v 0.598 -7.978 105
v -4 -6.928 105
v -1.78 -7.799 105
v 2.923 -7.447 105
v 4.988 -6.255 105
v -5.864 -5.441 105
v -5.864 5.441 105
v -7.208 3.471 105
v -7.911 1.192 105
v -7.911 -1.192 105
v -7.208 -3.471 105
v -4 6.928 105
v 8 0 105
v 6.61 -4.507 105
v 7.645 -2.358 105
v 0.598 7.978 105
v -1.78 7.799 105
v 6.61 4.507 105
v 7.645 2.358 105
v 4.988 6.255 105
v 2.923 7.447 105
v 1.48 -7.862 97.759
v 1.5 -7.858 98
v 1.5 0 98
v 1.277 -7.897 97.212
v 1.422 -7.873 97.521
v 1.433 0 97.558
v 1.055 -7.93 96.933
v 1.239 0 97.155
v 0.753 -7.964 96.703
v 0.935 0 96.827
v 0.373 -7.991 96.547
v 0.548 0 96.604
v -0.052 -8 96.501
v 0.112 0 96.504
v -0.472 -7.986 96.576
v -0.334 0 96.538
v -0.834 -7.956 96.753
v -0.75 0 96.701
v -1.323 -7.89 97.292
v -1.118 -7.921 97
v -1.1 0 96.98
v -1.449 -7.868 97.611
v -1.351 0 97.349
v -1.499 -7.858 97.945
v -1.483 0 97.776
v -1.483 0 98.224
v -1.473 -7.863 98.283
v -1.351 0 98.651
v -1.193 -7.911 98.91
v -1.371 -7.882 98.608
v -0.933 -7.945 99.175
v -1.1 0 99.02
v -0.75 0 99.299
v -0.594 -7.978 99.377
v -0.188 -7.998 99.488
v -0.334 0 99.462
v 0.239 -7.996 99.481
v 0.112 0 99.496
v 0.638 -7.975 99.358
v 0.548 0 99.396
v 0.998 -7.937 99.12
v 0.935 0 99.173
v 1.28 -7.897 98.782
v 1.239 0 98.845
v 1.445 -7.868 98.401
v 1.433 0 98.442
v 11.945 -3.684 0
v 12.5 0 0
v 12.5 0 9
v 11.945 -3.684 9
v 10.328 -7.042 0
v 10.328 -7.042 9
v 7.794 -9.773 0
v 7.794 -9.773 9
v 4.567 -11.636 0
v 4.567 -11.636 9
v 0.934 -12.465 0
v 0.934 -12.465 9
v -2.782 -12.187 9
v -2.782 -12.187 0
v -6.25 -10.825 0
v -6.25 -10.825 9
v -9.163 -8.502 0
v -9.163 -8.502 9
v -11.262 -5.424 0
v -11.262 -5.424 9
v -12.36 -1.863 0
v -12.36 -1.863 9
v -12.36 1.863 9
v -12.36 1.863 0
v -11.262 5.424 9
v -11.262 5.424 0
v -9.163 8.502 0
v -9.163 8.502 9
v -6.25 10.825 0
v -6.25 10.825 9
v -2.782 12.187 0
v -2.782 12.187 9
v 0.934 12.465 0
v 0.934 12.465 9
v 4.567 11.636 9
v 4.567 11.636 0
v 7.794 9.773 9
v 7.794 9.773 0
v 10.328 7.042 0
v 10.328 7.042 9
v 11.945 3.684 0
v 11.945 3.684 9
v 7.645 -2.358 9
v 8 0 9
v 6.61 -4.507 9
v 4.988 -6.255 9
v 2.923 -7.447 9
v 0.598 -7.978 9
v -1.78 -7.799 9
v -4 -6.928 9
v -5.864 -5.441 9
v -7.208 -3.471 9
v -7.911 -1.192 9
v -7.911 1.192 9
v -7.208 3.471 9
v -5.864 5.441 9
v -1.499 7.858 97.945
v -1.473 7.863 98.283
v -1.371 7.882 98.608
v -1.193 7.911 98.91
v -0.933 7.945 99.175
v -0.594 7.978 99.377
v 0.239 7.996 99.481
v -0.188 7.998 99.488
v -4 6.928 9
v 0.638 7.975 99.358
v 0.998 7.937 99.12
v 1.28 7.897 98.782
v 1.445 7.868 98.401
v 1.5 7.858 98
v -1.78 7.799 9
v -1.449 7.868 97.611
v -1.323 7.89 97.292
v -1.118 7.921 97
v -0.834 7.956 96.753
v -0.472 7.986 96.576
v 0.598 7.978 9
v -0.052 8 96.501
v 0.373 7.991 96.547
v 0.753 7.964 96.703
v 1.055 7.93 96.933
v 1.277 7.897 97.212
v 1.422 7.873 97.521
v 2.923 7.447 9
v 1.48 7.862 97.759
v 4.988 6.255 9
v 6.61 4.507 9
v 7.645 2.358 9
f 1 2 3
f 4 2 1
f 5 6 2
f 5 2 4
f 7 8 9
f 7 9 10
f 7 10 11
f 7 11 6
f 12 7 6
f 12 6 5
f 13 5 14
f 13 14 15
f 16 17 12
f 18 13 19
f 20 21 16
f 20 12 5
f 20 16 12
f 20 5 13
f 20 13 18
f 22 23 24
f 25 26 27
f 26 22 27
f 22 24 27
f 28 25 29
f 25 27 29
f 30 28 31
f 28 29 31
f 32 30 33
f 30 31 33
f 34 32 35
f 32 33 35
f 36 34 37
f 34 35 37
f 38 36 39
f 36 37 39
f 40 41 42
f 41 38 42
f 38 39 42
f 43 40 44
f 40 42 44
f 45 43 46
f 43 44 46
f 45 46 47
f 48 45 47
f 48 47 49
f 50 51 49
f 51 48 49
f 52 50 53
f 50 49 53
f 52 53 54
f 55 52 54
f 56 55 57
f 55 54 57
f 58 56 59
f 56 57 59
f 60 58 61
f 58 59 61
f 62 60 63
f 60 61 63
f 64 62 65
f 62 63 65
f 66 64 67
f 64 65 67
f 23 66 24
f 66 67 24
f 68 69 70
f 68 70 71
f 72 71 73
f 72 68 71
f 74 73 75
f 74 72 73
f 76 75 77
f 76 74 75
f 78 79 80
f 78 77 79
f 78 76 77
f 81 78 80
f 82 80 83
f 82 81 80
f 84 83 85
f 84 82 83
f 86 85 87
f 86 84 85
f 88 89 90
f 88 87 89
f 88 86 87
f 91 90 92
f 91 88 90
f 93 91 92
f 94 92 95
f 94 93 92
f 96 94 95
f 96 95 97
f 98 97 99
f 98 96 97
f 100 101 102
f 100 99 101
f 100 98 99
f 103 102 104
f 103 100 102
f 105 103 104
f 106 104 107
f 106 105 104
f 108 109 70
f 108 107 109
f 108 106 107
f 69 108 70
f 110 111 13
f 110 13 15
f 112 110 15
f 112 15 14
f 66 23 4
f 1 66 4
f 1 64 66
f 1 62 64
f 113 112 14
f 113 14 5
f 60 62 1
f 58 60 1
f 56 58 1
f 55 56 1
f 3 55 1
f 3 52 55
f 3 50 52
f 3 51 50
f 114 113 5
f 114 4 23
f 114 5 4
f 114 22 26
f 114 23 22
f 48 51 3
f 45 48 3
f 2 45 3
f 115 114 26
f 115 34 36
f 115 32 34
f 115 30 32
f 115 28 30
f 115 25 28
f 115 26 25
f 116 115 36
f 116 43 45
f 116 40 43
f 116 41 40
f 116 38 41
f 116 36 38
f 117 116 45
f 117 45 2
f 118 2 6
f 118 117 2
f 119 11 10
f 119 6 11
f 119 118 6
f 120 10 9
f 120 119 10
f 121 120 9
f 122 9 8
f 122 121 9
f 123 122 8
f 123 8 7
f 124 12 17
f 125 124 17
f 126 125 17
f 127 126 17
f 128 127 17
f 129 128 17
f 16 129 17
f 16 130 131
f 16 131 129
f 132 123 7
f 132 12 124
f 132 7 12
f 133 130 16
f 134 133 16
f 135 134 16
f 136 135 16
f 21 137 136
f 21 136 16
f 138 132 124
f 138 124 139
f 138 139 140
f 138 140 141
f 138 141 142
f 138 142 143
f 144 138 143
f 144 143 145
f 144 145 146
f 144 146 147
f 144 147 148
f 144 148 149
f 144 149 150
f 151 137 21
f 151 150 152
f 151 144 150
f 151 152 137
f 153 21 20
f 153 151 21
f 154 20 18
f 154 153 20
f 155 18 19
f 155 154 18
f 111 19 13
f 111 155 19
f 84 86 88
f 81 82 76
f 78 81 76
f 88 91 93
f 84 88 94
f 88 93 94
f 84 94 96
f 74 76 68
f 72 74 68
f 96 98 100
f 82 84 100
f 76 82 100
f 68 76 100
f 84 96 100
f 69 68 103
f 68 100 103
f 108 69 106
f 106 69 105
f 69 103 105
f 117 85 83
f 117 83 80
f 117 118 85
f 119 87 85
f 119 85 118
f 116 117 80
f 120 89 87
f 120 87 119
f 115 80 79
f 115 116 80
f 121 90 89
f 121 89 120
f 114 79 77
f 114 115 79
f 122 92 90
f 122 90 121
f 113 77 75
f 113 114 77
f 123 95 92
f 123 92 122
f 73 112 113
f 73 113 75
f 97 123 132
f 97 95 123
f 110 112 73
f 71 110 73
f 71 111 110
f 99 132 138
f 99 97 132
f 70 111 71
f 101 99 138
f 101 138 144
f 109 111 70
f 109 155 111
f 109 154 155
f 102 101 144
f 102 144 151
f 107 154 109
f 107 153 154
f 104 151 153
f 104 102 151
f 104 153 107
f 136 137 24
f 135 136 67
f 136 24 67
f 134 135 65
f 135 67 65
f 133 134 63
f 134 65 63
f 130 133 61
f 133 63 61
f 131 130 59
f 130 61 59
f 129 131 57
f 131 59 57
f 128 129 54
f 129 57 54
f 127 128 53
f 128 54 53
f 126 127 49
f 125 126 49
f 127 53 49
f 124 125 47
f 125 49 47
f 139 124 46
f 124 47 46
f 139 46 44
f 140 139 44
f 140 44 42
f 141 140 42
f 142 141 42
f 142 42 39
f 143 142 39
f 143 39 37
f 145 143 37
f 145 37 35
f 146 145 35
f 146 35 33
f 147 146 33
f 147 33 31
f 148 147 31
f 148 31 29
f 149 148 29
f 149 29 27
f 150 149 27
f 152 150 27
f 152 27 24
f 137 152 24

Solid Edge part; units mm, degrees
sketch "Sketch1" plane through (0, 0, 0) normal (0, 0, 1) x (1, 0, 0)
  circle A0 centre (0, 0) radius 12.5
extrude "Protrusion1" add sketch "Sketch1" along normal blind 9
sketch "Sketch2" plane through (0, 0, 9) normal (0, 0, 1) x (1, 0, 0)
  circle A0 centre (0, 0) radius 8
  dimension "D1" = 16
extrude "ExtrudedProtrusion_2" add sketch "Sketch2" along normal blind 96
sketch "Sketch3" plane through (0, 0, 0) normal (0, -1, 0) x (1, 0, 0)
  circle A0 centre (0, 98) radius 1.5
  dimension "D1" = 89
extrude "ExtrudedCutout_1" cut sketch "Sketch3" along normal mid plane 130.3633
properties part number "5" material "Fe - 410 W"
